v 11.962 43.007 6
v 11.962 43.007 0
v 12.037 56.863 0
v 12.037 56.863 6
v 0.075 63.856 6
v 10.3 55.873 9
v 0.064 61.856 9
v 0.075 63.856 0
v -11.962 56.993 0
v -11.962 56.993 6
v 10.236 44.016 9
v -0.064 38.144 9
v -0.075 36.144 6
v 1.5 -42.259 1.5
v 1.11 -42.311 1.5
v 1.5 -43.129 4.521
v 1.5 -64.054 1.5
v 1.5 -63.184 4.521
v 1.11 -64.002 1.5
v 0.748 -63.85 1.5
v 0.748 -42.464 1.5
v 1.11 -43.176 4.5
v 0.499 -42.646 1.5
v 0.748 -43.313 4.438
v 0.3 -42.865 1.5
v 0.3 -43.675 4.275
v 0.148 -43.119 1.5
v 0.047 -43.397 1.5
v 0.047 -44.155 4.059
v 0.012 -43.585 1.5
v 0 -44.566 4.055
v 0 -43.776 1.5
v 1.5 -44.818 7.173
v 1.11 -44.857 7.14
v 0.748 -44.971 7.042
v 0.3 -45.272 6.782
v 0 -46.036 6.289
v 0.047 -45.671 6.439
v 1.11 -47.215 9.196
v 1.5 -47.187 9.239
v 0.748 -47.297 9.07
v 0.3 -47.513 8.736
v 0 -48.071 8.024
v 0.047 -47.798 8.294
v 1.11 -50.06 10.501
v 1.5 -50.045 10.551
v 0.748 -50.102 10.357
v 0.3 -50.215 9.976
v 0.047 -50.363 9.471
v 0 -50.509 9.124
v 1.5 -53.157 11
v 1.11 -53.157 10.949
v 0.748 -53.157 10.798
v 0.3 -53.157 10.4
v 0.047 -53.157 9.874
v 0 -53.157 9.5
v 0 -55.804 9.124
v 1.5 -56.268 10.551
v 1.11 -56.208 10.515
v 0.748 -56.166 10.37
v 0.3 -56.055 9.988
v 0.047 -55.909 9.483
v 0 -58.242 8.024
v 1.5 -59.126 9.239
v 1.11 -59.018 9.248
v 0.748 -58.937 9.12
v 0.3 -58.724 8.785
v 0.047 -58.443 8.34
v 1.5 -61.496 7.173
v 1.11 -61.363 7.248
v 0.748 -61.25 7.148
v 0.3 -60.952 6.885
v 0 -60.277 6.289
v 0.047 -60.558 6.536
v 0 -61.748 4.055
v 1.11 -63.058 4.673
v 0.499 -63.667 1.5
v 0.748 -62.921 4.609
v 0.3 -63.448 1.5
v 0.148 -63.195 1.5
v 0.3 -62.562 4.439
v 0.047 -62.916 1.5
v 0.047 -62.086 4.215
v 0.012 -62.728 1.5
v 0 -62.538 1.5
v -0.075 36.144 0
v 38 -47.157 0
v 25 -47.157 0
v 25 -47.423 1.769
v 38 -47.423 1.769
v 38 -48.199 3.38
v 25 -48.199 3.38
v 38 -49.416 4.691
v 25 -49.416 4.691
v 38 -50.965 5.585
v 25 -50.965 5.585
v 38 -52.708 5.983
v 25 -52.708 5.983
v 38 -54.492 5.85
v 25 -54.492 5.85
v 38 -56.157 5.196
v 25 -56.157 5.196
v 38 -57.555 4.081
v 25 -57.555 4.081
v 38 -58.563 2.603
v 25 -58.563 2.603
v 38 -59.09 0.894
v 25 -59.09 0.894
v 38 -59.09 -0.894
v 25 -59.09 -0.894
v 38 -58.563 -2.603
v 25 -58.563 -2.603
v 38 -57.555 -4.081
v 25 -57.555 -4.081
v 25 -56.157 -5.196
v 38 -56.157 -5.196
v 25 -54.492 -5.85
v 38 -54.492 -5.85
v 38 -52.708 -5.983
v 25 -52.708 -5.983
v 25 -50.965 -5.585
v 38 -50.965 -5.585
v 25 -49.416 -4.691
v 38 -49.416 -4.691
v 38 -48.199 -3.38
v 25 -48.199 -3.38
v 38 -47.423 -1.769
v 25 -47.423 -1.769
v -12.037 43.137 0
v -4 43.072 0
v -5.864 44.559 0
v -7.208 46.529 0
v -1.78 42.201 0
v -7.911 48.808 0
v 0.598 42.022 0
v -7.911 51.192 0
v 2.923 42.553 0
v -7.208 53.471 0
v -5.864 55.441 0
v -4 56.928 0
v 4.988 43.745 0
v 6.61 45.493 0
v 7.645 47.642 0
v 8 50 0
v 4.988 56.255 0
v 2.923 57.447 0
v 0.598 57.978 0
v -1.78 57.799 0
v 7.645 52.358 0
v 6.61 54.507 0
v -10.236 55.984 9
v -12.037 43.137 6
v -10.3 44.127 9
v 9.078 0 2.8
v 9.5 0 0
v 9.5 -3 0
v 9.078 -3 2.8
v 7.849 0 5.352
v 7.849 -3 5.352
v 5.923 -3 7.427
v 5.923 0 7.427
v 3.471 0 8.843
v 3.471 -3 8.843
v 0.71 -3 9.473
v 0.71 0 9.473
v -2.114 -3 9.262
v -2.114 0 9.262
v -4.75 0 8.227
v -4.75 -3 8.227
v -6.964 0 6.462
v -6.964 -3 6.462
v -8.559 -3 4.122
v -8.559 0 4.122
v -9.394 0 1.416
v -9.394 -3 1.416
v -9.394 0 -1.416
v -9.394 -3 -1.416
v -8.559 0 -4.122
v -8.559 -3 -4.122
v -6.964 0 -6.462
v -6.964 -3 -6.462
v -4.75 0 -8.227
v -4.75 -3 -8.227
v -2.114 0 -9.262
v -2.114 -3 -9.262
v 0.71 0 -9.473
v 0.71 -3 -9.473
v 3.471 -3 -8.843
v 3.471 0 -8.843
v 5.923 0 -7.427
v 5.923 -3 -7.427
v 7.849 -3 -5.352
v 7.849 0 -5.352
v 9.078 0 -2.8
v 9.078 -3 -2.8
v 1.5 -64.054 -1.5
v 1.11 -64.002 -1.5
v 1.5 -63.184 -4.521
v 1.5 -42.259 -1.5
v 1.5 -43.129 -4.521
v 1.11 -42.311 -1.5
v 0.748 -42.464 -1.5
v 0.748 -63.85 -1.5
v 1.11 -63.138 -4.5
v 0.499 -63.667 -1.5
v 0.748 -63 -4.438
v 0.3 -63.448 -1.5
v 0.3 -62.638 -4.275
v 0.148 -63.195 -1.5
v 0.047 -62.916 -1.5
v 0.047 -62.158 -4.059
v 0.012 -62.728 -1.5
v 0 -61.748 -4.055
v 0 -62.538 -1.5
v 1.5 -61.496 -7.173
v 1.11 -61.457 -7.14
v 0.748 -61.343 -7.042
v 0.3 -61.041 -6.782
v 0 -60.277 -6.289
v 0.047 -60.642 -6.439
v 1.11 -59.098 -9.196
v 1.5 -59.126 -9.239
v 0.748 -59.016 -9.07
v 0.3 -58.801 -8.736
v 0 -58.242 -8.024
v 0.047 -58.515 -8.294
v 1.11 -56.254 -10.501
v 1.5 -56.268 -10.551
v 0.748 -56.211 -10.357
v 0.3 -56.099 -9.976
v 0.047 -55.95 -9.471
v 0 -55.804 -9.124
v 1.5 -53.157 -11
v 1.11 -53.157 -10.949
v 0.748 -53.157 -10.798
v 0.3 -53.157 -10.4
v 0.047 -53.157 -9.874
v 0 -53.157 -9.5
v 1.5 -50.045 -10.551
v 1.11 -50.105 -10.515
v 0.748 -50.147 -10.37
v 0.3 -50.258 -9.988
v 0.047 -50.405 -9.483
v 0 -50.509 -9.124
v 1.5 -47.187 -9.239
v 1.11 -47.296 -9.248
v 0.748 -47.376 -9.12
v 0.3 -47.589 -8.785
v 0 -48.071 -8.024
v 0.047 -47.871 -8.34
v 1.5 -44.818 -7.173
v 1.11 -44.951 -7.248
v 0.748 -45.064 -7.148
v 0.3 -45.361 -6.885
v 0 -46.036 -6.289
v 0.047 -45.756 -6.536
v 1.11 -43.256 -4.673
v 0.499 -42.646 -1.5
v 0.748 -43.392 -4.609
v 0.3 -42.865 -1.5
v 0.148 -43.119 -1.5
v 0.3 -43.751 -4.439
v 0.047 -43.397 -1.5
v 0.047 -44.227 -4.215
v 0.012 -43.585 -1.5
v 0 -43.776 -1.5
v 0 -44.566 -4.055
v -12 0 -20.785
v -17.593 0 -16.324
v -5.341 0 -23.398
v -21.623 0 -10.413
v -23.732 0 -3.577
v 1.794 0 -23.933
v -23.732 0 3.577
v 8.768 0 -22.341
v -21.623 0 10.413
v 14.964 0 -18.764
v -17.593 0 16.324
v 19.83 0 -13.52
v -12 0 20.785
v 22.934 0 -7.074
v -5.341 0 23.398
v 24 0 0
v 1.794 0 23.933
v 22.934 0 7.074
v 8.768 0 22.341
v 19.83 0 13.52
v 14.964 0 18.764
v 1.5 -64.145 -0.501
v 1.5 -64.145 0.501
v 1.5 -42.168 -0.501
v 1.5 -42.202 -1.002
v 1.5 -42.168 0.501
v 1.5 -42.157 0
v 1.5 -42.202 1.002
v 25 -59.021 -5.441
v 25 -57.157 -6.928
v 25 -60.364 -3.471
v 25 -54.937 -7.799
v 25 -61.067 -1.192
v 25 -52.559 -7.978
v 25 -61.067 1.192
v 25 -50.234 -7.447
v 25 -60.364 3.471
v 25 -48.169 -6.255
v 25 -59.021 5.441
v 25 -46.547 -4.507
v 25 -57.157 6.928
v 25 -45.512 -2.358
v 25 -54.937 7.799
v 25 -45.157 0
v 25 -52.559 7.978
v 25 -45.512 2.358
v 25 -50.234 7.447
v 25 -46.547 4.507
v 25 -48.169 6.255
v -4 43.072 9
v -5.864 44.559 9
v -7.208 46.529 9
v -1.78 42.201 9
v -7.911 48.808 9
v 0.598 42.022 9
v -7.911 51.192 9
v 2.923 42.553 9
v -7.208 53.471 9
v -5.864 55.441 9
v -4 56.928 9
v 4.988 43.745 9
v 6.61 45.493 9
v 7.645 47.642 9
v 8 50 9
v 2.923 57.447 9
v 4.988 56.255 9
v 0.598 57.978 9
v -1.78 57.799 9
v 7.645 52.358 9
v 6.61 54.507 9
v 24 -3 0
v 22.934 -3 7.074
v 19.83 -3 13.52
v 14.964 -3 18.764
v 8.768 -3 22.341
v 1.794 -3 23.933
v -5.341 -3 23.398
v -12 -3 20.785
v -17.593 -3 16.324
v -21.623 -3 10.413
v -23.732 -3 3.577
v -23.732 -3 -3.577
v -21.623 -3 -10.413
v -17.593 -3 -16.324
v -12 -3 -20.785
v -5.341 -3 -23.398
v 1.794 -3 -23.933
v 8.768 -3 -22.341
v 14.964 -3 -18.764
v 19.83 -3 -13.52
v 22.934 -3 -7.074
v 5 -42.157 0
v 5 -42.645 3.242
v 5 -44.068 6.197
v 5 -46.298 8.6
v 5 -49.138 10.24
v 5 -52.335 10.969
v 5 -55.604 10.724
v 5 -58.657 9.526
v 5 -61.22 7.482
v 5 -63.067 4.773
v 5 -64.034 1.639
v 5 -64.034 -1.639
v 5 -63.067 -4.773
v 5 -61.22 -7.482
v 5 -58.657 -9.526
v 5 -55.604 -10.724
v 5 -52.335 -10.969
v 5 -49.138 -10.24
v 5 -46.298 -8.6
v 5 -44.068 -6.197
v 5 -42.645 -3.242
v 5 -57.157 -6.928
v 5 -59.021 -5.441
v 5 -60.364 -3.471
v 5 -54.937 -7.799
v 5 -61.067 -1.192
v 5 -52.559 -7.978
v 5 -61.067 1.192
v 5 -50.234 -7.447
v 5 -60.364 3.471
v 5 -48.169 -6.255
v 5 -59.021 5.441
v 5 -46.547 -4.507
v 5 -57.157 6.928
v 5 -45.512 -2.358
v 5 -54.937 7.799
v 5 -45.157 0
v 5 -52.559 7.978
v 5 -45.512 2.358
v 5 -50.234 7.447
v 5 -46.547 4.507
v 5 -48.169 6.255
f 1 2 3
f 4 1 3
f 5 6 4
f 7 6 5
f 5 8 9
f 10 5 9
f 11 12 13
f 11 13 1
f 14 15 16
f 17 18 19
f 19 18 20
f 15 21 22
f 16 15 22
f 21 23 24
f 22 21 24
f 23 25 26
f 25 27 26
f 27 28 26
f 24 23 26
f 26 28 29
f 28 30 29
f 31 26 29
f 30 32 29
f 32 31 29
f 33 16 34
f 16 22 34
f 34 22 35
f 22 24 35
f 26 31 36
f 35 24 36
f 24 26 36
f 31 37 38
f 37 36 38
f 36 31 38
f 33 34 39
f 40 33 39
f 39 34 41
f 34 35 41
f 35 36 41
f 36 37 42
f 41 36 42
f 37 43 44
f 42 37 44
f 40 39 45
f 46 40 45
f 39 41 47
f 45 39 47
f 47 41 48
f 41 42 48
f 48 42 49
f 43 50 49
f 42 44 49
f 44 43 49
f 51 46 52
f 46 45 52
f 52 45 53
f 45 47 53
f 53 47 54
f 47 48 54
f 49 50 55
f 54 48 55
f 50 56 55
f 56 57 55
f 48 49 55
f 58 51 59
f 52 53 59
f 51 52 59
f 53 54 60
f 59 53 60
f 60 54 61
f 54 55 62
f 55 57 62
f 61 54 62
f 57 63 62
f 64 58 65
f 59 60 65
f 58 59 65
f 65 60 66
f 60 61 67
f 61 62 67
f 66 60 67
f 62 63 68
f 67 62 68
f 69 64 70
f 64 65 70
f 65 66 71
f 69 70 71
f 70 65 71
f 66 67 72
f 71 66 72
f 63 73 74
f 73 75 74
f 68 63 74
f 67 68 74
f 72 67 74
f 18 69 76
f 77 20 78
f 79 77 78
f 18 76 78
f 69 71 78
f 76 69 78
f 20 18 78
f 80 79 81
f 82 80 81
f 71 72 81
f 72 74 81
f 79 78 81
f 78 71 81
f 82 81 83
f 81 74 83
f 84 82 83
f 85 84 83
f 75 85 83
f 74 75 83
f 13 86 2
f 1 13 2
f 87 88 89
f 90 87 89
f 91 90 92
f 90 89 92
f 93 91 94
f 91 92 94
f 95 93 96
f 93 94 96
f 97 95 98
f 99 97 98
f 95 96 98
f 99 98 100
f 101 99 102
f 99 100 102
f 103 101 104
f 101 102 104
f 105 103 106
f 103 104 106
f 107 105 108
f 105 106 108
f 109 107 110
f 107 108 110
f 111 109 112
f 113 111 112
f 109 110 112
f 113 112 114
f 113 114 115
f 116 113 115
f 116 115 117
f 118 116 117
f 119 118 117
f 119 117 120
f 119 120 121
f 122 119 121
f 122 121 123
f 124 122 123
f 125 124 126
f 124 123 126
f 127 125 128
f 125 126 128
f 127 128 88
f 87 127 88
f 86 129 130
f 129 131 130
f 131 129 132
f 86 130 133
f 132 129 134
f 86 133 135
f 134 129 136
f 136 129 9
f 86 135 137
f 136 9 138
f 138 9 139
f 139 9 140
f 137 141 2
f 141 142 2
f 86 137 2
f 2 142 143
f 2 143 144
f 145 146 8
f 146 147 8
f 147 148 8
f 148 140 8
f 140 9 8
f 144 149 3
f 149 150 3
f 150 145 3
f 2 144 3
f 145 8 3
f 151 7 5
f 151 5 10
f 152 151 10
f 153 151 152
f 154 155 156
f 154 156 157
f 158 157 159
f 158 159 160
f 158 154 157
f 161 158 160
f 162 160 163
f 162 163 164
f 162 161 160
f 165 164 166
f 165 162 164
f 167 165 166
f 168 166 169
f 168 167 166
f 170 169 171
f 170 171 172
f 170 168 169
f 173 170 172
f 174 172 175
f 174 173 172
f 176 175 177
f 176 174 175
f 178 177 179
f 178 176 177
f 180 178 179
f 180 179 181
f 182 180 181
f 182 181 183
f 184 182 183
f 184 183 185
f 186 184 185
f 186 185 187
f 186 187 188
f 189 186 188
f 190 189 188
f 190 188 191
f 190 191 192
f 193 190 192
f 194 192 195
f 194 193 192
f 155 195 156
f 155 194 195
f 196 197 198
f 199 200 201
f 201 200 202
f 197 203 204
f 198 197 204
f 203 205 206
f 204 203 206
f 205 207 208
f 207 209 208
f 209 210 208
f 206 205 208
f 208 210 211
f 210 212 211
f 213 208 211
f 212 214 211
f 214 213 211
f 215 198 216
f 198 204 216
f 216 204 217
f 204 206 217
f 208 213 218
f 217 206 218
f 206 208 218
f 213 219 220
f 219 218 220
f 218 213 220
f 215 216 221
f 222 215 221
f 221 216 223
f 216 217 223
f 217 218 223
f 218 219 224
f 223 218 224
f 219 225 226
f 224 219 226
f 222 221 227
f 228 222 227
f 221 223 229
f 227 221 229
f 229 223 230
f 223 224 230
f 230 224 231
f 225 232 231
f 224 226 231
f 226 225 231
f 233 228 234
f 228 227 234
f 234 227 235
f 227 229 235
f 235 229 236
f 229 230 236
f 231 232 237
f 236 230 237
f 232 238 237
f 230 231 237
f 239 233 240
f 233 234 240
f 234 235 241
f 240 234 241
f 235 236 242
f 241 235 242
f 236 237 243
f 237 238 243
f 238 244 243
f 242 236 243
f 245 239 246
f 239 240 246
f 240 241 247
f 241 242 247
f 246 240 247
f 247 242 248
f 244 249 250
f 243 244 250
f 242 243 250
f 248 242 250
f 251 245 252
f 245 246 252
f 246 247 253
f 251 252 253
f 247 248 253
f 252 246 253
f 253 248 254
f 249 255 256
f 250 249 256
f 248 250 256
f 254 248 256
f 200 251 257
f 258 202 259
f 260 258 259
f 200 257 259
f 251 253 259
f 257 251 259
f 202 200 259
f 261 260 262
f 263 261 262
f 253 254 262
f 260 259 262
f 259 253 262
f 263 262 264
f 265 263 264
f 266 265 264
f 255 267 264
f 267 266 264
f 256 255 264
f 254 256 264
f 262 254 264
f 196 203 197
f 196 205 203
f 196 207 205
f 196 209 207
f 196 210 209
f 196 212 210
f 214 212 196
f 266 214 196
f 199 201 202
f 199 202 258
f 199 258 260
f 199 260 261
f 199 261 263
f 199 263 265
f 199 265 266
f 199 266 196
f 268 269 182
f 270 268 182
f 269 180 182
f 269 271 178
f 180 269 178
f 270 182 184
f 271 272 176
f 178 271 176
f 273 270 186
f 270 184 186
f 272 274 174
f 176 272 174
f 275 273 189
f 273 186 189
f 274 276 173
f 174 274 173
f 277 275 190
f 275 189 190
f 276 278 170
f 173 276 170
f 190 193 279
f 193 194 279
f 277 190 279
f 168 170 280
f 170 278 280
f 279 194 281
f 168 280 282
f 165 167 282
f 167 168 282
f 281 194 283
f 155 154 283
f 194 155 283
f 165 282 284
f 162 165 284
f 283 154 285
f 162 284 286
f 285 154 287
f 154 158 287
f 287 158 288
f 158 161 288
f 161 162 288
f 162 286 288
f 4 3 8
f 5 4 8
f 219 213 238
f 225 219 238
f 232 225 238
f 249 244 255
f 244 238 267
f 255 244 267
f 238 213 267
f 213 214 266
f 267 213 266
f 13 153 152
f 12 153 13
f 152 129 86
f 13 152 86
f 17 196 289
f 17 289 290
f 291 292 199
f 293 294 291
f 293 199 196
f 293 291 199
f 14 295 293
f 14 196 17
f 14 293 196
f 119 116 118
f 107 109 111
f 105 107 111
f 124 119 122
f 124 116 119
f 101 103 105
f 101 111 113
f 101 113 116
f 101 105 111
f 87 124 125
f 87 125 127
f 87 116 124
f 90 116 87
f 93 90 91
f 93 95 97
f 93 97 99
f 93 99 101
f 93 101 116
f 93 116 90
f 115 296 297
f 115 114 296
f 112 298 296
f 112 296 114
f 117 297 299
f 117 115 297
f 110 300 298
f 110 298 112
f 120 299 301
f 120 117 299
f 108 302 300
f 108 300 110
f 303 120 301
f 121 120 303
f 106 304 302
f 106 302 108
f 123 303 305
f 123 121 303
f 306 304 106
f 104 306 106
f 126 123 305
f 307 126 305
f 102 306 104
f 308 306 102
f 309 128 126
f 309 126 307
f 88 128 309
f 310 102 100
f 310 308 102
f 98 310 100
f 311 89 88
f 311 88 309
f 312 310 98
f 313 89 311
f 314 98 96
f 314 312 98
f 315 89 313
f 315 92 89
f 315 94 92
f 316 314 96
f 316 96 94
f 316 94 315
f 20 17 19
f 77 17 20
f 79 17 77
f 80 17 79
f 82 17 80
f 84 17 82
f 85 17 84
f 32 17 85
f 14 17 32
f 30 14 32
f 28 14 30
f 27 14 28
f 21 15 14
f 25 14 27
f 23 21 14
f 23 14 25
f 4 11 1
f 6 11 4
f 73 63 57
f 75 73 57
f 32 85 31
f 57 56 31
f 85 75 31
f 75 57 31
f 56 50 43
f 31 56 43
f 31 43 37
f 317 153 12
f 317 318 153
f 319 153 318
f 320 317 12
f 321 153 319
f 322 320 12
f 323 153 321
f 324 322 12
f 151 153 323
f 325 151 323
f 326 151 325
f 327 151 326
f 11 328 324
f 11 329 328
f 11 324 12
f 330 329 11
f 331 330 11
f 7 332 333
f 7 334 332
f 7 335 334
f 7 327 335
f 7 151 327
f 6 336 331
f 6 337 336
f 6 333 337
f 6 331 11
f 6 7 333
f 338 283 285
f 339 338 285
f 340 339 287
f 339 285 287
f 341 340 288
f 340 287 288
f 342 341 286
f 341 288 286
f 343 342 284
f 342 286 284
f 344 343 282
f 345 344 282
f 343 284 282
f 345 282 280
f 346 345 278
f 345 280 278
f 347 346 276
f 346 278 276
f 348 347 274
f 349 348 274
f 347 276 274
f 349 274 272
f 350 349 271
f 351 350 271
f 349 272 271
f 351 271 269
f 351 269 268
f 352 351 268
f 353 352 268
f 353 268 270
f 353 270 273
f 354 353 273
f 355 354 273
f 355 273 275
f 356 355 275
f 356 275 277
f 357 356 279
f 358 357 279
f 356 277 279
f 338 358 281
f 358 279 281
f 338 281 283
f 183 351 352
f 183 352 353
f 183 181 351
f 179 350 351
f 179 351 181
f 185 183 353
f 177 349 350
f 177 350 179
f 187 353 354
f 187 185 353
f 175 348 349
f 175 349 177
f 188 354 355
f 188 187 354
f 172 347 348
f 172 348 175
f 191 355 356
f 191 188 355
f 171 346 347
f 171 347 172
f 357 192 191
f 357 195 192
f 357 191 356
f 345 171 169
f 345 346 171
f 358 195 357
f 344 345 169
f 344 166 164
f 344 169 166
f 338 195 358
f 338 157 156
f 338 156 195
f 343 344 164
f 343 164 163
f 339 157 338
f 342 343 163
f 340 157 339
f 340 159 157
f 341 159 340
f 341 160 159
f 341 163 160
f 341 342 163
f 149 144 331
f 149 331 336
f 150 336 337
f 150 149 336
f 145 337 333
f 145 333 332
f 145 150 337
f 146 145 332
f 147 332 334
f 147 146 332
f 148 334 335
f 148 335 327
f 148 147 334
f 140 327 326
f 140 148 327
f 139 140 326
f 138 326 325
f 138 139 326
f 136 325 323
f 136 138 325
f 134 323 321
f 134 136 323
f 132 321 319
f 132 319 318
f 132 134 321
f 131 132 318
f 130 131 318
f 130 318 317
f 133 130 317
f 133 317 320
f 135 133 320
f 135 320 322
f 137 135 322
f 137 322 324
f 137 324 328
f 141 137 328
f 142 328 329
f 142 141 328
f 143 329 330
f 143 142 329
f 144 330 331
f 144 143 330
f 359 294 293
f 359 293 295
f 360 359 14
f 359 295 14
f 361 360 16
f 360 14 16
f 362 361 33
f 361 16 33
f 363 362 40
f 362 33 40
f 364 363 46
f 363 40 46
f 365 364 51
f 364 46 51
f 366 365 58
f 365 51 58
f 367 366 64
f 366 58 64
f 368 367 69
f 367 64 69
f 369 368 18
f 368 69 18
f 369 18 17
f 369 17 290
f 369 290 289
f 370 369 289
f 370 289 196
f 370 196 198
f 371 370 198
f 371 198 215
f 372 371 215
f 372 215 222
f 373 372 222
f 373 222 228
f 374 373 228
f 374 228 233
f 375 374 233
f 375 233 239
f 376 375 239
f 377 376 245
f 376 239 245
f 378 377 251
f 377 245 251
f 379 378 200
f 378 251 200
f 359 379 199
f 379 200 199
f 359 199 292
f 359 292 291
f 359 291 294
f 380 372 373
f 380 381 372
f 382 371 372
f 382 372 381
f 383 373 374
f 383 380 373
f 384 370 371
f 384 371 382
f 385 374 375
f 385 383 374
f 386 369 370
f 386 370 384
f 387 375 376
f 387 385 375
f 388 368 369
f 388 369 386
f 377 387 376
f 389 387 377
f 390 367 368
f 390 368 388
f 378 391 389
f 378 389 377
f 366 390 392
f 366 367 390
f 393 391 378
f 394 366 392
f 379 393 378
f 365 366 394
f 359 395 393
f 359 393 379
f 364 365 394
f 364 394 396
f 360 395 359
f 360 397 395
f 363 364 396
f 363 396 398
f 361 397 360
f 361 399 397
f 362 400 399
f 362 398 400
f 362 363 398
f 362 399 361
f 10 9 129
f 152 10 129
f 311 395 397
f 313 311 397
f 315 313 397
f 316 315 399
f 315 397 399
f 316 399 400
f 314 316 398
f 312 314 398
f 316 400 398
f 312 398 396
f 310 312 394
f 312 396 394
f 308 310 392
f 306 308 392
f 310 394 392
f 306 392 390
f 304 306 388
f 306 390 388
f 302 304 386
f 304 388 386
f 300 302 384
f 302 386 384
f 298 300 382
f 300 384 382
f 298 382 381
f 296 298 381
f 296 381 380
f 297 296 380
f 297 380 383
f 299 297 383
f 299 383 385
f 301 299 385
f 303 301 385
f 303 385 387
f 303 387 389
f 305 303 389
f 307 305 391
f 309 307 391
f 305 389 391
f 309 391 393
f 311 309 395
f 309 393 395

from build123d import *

# Parameters (mm, degrees)
F0_R           = 24
F0_R_2         = 9.5
F1_DEPTH       = 3
F2_R           = 8
F3_DEPTH       = 9
F4_SIZE2       = 1.7320508076
F4_SIZE        = 3
F5_R           = 11
F6_DEPTH       = 5
F7_R           = 8
F8_DEPTH       = 20
F9_R           = 6
F10_DEPTH      = 13
F13_DEPTH      = 11.001
F13_DEPTH_BACK = 117.0138960066
F14_R          = 1.5


with BuildPart() as f1:
    # F0 (on Front) → F1 (new body)
    with BuildSketch(Plane.XZ):
        Circle(F0_R)
        Circle(F0_R_2, mode=Mode.SUBTRACT)
    extrude(amount=F1_DEPTH)


with BuildPart() as f3:
    # F2 (on Top) → F3 (new body)
    with BuildSketch(Plane.XY):
        Polygon((0.0749564451, 63.85620372), (-11.962346199, 56.9930160457), (-12.0373026441, 43.1368123256), (-0.0749564451, 36.14379628), (11.962346199, 43.0069839543), (12.0373026441, 56.8631876744), align=None)
        with Locations((0, 50)):
            Circle(F2_R, mode=Mode.SUBTRACT)
    extrude(amount=F3_DEPTH)

    # F4
    f4_edges = [f3.edges().sort_by_distance(p)[0] for p in [
        (11.999824, 49.935086, 9),
        (5.943695, 39.57539, 9),
        (-6.05613, 39.640304, 9),
        (6.05613, 60.359696, 9),
        (-5.943695, 60.42461, 9),
        (-11.999824, 50.064914, 9),
    ]]
    chamfer(f4_edges, length=F4_SIZE, length2=F4_SIZE2)


with BuildPart() as f6:
    # F5 (on Right) → F6 (new body)
    with BuildSketch(Plane.YZ):
        with Locations((-53.1566922865, 0)):
            Circle(F5_R)
    extrude(amount=F6_DEPTH)

    # F7 (on face) → F8 (join)
    with BuildSketch(Plane.YZ.offset(5)):
        with Locations((-53.1566922865, 0)):
            Circle(F7_R)
    extrude(amount=F8_DEPTH)

    # F9 (on face) → F10 (join)
    with BuildSketch(Plane.YZ.offset(25)):
        with Locations((-53.1566922865, 0)):
            Circle(F9_R)
    extrude(amount=F10_DEPTH)

    # F12 (on plane+point) → F13 (cut, two sides)
    with BuildSketch(Plane.XZ.offset(53.1566922865)) as f13_sk:
        Polygon((1.5, 1.5), (0, 1.5), (0, 0), (0, -1.5), (1.5, -1.5), align=None)
    extrude(amount=F13_DEPTH, mode=Mode.SUBTRACT)
    extrude(f13_sk.sketch, amount=-F13_DEPTH_BACK, mode=Mode.SUBTRACT)

    # F14
    f14_edges = [f6.edges().sort_by_distance(p)[0] for p in [
        (0, -53.156692, 11),
        (0, -53.156692, -11),
    ]]
    fillet(f14_edges, radius=F14_R)


solid = Compound([f1.part, f3.part, f6.part])
